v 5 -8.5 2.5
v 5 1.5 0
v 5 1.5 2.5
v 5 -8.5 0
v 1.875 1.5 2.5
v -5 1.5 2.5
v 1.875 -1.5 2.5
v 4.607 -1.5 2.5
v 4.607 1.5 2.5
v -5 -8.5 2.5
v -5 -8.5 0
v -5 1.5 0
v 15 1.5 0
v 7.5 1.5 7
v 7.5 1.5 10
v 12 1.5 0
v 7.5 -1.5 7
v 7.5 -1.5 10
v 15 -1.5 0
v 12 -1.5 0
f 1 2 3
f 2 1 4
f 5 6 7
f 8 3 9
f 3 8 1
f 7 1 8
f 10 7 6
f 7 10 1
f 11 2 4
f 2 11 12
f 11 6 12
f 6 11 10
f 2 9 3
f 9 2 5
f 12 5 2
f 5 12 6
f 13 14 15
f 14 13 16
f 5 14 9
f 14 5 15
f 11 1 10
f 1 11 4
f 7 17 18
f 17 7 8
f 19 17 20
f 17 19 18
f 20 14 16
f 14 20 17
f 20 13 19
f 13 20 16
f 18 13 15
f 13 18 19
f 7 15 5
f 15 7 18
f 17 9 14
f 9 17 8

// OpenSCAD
/**
 * This is a small clip for fixing small wires to walls.
 *
 * A countersink could be added, but not done yet.
 *
 * Print laying on its side for maximum strength. No supports needed. It's
 * pretty small, so that strength is desired.
 *
 * Designed to be strong, minimal footprint, easy to print, and wire can be
 * wrapped around the arm.
 */

armHeight=10;
armReach=15;
armWidth=3;
armThickness=3;
bodyWidth=10;
bodyThickness=2.5;

module body() {
  difference() {
    translate([0, bodyWidth / -2 + armWidth / 2, bodyThickness / 2])
      cube([
        bodyWidth,
        bodyWidth,
        bodyThickness,
      ], center=true);
  }
}

module arm() {
  translate([0, armWidth / 2, 0])
  rotate([90, 0, 0])
    linear_extrude(armWidth)
  polygon(points=[
    [0, 0],
    [armReach / 2, armHeight],
    [armReach, 0],
    [armReach - armThickness, 0],
    [armReach / 2, armHeight - armThickness],
    [armThickness, 0],
    [0, 0],
  ]);
}

body();
arm();
